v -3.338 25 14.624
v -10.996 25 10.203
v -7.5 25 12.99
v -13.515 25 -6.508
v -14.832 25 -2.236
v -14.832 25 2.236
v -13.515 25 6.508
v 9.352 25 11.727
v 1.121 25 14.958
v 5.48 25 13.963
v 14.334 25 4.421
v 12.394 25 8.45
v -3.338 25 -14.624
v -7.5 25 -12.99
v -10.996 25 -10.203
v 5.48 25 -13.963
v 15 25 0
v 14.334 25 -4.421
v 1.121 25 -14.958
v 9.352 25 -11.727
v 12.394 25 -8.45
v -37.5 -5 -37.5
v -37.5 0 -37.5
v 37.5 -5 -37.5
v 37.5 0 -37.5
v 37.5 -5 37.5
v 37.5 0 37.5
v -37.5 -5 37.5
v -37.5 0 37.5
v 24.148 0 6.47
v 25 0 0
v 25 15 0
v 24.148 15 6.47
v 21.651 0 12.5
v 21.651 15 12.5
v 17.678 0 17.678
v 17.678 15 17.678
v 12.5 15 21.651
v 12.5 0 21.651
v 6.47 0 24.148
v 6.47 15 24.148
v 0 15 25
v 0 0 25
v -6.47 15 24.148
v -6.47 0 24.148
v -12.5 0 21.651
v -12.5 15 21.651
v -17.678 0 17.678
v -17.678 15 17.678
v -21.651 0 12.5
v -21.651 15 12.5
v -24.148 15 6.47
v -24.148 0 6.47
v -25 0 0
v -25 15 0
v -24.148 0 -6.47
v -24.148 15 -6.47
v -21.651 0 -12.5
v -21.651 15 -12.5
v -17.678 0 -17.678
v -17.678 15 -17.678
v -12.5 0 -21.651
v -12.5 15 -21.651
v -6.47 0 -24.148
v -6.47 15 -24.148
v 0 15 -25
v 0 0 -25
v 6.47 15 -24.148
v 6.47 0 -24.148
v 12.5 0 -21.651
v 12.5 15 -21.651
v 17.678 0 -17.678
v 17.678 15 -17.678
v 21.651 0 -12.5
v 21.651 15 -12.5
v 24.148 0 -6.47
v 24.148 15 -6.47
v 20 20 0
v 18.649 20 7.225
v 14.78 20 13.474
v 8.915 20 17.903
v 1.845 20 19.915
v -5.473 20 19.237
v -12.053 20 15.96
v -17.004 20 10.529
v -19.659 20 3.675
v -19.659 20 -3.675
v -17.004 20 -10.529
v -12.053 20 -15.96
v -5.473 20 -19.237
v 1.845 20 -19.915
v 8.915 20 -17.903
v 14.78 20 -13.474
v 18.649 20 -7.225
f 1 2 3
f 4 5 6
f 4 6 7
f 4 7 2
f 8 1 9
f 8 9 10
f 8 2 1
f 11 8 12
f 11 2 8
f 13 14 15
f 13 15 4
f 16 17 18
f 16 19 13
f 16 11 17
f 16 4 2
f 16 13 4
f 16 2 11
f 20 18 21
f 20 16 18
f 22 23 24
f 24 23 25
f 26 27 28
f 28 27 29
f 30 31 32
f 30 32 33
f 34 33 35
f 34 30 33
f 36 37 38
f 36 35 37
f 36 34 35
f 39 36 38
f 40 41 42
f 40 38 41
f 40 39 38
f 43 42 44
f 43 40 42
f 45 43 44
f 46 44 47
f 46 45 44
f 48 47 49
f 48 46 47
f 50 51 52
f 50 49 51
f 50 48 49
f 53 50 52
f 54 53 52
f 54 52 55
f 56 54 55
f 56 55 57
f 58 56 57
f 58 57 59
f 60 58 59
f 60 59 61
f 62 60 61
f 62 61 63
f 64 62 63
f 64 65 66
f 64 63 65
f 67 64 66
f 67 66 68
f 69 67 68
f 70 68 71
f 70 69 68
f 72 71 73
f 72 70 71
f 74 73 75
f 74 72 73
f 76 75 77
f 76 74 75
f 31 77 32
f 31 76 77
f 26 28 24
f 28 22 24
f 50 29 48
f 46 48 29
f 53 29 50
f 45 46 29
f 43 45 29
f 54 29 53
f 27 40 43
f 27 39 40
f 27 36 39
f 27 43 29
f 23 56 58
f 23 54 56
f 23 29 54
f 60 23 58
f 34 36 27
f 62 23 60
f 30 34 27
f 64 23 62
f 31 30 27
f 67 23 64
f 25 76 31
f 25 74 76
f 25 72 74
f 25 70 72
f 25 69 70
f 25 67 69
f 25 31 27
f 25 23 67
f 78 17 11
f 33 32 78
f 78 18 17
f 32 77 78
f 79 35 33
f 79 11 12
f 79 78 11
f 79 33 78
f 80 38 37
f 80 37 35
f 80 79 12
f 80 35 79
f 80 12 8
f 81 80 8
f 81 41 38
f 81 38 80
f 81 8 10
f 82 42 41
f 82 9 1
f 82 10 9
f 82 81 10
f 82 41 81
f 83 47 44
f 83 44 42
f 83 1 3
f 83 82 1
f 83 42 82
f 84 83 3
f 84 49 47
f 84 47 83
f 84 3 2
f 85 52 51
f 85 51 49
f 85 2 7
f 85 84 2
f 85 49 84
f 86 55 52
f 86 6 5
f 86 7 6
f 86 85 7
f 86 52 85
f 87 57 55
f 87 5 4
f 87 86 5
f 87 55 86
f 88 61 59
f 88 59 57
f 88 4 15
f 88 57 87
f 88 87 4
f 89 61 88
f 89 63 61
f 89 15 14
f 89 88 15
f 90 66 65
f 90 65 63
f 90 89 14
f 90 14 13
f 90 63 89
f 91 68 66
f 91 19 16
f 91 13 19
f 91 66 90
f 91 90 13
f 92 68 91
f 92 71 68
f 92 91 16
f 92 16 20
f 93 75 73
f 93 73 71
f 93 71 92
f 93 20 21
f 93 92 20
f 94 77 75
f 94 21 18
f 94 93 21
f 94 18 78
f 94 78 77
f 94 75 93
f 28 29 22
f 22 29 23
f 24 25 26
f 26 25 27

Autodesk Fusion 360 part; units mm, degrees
sketch "Sketch1" plane through (0, 0, 0) normal (0, 1, 0) x (1, 0, 0)
  circle A0 centre (0, 0) radius 25
  dimension "d1" = 50
extrude "Extrude1" add sketch "Sketch1" along normal blind 25
sketch "Sketch2" plane through (0, 0, 0) normal (0, 1, 0) x (1, 0, 0)
  line L0 (37.5, -37.5) -> (-37.5, -37.5)
  line L1 (-37.5, -37.5) -> (-37.5, 37.5)
  line L2 (-37.5, 37.5) -> (37.5, 37.5)
  line L3 (37.5, 37.5) -> (37.5, -37.5)
  line L4 (37.5, -37.5) -> (-37.5, 37.5) construction
  line L5 (-37.5, -37.5) -> (37.5, 37.5) construction
  dimension "d4" = 75
  dimension "d5" = 75
extrude "Extrude2" add sketch "Sketch2" against normal blind 5
chamfer "Chamfer1" distance 10 angle 45 1 edges at (-23.3082, 25, 9.0404)
